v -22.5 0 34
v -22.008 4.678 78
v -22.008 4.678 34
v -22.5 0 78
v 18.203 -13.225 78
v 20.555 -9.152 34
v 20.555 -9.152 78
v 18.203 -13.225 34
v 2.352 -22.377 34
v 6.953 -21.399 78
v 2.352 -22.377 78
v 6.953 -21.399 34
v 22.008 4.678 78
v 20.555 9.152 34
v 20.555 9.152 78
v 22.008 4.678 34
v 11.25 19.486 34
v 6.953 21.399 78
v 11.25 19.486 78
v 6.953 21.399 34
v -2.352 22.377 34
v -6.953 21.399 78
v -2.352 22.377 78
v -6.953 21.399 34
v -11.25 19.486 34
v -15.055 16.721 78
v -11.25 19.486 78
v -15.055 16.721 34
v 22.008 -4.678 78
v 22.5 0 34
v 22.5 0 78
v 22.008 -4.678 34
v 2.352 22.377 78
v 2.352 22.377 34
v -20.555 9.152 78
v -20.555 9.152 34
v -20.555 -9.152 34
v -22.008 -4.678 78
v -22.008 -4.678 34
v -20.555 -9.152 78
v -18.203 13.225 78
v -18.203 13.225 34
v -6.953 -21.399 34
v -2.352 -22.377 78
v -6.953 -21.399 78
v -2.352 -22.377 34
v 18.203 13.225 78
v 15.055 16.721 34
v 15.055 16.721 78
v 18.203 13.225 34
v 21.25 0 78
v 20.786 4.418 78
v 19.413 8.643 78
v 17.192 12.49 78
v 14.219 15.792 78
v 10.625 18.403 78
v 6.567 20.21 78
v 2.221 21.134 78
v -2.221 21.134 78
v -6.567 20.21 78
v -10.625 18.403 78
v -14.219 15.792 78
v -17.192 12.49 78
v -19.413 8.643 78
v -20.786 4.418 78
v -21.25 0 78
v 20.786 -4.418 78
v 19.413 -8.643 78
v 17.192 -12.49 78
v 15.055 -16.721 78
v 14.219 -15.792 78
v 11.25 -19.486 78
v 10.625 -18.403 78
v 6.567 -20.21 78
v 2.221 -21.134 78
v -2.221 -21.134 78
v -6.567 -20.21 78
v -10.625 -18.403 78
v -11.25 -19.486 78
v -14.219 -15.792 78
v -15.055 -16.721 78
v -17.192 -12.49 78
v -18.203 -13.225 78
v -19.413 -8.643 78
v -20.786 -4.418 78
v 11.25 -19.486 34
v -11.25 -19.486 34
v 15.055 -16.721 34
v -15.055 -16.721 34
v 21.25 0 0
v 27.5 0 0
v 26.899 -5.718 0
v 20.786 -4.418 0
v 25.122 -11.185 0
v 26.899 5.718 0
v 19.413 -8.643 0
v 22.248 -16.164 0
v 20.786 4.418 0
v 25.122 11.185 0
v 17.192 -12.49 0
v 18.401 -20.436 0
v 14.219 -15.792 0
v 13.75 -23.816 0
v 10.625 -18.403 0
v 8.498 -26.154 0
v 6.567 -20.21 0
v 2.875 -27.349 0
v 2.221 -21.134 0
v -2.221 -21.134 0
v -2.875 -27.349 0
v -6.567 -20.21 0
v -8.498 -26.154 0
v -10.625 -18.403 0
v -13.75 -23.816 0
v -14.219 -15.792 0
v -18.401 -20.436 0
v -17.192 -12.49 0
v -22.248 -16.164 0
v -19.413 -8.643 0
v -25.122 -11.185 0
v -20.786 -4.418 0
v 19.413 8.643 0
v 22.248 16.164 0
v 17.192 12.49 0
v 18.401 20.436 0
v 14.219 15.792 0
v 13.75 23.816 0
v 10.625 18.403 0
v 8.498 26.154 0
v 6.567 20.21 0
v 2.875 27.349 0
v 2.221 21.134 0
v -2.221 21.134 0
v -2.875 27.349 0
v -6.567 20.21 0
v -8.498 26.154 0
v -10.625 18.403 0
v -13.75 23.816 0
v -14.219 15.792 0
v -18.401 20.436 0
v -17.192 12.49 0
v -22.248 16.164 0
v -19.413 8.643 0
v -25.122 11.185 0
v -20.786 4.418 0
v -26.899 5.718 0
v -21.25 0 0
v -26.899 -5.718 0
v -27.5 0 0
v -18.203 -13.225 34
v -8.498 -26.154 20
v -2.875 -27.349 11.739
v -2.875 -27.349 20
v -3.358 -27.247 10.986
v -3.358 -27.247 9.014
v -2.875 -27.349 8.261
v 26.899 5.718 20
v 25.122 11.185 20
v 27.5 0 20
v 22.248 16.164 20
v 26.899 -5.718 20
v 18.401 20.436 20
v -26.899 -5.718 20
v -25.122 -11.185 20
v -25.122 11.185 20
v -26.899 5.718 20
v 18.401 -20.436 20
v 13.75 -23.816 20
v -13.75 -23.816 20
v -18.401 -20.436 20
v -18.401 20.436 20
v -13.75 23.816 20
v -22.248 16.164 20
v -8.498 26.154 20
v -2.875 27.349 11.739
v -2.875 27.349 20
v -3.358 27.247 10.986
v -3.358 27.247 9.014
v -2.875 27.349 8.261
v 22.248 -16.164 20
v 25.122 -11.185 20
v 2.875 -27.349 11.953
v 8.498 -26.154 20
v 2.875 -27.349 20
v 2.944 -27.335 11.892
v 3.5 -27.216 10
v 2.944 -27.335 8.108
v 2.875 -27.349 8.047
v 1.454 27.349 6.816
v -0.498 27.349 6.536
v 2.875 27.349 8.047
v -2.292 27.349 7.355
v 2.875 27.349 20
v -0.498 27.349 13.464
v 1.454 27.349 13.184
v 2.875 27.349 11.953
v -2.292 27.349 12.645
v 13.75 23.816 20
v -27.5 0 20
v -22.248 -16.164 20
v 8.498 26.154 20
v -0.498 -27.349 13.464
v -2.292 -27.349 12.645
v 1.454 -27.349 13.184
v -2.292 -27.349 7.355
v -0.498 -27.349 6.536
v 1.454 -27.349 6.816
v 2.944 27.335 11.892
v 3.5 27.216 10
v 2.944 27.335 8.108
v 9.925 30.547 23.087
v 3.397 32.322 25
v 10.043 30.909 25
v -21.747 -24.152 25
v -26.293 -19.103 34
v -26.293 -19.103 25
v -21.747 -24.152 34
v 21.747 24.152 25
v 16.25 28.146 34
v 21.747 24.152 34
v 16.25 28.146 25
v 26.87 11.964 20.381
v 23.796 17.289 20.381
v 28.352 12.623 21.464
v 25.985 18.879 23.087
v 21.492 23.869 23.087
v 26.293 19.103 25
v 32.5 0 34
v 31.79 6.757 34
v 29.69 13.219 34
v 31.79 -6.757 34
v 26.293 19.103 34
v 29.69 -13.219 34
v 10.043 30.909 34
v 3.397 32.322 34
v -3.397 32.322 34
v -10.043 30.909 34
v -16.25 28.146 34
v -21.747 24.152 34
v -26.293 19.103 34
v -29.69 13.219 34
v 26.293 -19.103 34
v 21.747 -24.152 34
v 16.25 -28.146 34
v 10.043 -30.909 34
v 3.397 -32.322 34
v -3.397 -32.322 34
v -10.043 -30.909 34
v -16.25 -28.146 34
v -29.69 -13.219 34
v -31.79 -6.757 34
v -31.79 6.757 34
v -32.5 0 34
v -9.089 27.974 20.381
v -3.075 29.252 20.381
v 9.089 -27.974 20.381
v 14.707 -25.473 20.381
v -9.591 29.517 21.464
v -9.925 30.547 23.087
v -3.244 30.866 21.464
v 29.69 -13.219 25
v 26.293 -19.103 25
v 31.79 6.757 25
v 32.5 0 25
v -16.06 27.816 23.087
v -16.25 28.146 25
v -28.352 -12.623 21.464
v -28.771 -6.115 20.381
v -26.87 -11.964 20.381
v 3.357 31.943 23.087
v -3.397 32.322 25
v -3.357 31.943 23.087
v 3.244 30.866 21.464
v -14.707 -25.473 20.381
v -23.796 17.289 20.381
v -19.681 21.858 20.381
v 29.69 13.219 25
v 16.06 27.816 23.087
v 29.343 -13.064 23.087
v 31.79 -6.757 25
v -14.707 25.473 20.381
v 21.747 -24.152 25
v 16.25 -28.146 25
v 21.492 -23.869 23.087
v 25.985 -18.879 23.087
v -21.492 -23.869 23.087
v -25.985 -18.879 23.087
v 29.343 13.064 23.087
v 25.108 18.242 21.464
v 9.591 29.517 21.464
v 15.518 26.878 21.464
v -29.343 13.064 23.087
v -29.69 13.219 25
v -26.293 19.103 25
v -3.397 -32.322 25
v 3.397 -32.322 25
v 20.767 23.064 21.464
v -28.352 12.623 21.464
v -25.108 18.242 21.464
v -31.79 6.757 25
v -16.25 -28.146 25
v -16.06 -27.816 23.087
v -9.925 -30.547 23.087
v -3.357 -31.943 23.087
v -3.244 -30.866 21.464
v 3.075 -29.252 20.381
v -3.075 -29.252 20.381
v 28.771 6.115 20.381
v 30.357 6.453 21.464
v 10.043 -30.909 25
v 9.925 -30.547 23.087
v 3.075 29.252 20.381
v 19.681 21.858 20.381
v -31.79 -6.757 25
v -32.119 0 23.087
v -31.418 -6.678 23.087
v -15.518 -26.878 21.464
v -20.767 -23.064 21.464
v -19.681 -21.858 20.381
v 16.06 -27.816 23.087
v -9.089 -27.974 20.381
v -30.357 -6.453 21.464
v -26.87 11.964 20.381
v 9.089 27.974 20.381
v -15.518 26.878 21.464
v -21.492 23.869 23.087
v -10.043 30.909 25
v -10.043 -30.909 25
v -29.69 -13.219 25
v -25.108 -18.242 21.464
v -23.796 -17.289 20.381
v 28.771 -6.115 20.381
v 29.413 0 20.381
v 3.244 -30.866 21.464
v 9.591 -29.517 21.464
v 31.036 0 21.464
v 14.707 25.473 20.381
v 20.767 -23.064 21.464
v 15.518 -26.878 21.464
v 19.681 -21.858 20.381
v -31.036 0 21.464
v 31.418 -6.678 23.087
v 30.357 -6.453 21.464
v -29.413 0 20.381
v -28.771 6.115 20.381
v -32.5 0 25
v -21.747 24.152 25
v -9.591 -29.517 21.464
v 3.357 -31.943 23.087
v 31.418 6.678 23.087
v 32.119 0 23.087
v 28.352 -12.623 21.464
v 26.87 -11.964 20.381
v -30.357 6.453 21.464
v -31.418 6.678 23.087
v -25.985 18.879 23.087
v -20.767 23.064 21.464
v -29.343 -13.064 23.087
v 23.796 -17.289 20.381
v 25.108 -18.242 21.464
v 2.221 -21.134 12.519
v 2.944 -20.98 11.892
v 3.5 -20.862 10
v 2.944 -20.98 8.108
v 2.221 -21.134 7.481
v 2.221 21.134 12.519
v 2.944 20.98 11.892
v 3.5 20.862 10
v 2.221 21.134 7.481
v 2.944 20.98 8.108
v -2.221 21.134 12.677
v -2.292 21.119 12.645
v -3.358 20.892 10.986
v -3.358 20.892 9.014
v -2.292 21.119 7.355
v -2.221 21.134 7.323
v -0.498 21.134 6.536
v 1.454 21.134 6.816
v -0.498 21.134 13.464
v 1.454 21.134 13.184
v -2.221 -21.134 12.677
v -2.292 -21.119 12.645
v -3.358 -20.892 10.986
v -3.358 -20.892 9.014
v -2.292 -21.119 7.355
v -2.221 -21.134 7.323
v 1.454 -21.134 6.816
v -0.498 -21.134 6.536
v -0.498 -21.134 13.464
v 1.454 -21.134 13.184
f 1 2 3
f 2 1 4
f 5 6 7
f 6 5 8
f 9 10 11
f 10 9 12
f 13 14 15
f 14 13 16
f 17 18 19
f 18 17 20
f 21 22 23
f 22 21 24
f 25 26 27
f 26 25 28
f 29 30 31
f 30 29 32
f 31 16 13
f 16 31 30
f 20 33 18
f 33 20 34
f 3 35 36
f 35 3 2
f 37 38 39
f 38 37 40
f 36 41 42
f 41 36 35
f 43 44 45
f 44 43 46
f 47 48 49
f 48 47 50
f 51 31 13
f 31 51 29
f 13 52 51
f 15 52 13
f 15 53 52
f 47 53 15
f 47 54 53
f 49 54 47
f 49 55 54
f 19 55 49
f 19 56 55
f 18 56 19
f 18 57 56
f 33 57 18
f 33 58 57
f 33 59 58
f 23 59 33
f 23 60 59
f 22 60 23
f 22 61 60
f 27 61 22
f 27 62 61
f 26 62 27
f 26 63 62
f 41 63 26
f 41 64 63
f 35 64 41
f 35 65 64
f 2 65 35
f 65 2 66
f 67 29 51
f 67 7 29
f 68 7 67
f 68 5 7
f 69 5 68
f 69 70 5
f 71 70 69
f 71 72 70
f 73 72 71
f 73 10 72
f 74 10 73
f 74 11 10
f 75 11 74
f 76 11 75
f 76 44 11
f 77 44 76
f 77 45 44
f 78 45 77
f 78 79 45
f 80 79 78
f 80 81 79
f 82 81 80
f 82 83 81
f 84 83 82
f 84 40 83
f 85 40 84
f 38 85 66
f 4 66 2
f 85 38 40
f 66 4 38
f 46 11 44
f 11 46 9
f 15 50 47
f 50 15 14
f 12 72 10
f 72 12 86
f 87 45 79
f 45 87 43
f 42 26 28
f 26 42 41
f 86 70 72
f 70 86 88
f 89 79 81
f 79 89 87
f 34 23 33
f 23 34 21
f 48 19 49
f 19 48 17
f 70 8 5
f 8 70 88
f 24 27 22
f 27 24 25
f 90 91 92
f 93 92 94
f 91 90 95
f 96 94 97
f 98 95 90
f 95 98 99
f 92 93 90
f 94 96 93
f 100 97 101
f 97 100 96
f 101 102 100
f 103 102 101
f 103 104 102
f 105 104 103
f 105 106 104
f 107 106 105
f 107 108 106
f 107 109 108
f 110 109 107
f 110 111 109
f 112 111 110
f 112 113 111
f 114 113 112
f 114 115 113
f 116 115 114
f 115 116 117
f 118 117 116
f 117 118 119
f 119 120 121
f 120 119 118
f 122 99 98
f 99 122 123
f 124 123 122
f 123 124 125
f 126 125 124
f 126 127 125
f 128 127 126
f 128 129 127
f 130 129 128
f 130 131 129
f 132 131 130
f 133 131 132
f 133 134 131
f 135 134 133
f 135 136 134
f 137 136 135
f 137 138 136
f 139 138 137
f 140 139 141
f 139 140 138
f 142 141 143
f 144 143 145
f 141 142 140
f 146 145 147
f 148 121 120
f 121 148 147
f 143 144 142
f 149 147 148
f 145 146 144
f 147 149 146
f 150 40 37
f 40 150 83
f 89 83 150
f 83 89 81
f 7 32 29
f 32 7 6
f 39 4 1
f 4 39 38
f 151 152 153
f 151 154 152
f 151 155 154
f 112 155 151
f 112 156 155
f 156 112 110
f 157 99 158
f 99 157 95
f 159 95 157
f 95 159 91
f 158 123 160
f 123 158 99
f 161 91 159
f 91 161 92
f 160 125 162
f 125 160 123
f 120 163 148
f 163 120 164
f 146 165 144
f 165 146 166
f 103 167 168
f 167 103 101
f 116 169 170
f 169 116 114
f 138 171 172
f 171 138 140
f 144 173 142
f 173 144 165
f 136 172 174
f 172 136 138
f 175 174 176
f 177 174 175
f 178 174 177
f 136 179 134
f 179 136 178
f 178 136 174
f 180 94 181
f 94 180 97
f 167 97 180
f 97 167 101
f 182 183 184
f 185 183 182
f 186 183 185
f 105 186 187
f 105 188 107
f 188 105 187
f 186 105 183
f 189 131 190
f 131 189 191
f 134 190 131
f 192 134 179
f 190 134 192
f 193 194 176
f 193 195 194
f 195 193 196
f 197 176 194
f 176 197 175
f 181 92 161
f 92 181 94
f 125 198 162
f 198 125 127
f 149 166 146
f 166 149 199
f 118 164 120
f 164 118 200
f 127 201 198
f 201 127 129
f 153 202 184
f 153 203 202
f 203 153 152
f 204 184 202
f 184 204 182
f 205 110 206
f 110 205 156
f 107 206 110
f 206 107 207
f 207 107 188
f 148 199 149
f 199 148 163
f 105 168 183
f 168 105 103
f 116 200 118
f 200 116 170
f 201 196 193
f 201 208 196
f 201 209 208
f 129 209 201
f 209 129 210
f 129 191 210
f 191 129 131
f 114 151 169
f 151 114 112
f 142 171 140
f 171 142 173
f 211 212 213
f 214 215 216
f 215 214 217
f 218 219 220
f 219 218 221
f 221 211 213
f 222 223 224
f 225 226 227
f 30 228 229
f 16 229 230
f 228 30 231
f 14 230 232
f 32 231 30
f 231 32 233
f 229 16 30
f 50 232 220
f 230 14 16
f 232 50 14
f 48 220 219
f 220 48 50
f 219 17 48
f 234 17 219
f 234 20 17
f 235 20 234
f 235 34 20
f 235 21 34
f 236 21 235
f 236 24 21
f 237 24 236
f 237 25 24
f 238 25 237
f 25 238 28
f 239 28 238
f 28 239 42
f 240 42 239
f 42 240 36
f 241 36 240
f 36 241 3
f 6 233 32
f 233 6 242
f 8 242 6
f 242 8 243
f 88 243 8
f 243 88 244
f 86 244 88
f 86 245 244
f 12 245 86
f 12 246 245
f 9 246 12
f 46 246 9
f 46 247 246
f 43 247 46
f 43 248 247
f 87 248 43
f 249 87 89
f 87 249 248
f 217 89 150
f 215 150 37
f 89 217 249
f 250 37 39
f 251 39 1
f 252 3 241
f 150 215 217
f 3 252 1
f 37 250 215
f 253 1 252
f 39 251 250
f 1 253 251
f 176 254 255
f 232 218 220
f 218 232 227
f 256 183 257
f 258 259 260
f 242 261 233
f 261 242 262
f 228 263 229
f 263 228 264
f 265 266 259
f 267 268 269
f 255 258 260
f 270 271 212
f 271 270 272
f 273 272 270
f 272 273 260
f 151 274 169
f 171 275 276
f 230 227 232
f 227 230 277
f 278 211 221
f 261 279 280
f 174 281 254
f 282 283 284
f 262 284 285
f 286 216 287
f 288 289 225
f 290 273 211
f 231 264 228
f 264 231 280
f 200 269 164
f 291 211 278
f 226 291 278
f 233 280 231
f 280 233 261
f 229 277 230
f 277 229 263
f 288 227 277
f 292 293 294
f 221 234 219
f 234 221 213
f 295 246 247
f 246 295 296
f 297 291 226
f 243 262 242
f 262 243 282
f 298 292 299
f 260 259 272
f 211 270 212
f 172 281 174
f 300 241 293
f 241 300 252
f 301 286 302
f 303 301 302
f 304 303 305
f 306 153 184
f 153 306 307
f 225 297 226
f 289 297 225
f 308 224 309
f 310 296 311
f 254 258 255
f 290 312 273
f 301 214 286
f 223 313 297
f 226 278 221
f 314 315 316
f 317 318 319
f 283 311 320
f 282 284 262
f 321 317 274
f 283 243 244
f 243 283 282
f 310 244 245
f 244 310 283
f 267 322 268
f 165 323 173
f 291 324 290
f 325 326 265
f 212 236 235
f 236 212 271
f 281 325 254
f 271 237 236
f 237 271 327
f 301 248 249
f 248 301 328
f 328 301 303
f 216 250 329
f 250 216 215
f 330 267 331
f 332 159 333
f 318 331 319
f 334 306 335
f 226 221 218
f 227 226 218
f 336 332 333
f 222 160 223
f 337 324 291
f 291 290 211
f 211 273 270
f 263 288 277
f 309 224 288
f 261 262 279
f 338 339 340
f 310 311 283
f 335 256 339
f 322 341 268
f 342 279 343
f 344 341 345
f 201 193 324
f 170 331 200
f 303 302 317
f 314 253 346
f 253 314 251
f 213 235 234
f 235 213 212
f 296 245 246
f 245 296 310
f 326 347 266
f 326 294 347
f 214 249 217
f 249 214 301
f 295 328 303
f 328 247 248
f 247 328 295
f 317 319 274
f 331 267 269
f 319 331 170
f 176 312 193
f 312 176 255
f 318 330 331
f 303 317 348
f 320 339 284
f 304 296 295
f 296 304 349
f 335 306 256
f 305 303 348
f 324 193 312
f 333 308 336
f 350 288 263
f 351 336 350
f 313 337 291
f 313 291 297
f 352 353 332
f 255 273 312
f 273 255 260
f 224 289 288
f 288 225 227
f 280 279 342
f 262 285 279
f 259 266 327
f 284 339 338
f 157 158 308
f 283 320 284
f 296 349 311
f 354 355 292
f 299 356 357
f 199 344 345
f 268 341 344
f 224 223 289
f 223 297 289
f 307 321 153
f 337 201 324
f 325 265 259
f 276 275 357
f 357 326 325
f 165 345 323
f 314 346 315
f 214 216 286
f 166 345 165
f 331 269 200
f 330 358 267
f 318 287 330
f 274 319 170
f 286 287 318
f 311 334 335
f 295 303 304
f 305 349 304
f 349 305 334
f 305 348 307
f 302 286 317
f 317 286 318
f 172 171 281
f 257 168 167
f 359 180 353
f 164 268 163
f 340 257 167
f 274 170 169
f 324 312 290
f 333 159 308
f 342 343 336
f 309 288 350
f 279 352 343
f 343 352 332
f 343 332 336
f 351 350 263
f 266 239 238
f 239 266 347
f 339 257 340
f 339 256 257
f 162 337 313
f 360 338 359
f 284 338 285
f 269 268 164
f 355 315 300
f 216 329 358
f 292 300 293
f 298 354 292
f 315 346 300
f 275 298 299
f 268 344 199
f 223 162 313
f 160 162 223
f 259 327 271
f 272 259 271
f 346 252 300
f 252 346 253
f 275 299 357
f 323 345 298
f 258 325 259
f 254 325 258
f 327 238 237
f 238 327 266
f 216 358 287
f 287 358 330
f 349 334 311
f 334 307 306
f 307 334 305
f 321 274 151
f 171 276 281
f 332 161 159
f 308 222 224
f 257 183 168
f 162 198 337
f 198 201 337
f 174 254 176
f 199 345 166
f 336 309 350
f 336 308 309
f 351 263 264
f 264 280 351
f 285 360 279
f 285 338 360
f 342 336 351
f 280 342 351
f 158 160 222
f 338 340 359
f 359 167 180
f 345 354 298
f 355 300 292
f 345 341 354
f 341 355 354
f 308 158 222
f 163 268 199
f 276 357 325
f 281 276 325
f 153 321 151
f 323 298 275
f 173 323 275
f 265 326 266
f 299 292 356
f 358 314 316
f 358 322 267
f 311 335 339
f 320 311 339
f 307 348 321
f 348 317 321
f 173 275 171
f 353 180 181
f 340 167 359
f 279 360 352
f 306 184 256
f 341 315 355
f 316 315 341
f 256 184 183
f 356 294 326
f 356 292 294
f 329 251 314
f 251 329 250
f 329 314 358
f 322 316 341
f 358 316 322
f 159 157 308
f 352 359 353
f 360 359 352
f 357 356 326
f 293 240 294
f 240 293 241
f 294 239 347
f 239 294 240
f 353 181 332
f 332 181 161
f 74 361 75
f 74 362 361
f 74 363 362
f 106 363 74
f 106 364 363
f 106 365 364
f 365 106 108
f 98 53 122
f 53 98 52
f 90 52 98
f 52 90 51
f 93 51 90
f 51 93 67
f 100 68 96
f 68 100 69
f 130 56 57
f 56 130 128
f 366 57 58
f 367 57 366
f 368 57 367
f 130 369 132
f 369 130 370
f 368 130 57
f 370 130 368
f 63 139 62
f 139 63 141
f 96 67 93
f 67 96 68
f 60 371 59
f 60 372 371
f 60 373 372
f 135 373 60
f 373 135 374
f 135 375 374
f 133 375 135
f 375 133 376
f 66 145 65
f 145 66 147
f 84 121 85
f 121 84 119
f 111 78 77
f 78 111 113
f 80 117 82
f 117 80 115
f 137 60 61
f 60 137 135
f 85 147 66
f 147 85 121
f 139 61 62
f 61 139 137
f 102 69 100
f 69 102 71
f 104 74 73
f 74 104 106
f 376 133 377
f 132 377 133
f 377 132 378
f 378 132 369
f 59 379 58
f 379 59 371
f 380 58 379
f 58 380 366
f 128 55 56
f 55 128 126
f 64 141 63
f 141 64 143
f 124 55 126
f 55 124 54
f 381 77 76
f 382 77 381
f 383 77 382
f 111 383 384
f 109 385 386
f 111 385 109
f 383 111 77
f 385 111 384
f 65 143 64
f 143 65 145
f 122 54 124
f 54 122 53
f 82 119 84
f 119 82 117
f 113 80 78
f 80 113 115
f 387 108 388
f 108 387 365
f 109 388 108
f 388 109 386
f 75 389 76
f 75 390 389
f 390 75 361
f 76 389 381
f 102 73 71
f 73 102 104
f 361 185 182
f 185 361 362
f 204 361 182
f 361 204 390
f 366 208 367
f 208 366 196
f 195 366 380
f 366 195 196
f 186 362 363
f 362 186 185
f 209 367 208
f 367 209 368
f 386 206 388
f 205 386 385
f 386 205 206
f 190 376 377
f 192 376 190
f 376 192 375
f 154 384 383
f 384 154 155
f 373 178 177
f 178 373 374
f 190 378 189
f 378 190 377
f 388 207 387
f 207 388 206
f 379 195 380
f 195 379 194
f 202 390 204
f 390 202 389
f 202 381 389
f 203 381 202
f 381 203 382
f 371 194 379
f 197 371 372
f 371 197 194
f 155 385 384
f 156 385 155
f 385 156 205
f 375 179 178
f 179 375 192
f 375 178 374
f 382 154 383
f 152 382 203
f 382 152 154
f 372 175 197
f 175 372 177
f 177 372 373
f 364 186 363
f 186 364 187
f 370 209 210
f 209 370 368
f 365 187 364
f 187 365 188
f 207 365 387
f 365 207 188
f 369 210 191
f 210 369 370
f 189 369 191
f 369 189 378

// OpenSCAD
// file: parameters/verticalShaftHolderParameters.scad
// https://paper.dropbox.com/doc/Shaft-Holder-with-Bearings--BPUd0R93dqpLMge3XfPWzi2zAg-a79LjXcU3vrNJJHZMteSG

rollerBearingInsideDiameter = 45; // Same as Thrust Bearing bore diameter
rollerBearingHeight = 20;
rollerBearingOutsideDiameter = 52.2;

thrustBearingOutsideDiameter = 65;
thrustBearingHeight = 14;
thrustBearingOuterDiameterShaftWasher = 47;

thrustBearingMinimumAbutmentDiameter = 57; // This is a MINIMUM

comfortablePinningDiameter = 55; // Could maybe be bigger?
comfortablePinnedSectionHeight = 20; // May need testing
// file: parameters/commonParameters.scad
// All measurements in millimeters

// "horizontal" and "vertical" refer to how they are printed on the print bed,
// not how they work on the final assembly.
// ALWAYS print verticle pipes straight up if possible, that is 90 degrees from the bed.
// Attempting to print a slanted pipe will be troublesome and require testing for a proper size.
// However, you can print ANY angle ON the bed.

// 1.25" PVC Pipe:
horizontalPipeInsideDiameter_1_25pvc = 42.9;
verticalPipeInsideDiameter_1_25pvc = 42.5;

// 0.5" PVC Pipe:
horizontalPipeInsideDiameter_0_50pvc = 22.1;
verticalPipeInsideDiameter_0_50pvc = 21.7;

// Parameters
jointLegLength = 50;
jointWallThickness = 3.5;
jointPinningHoleDiameter = 7;
jointPinHoleOffset = 10;

// Walker Foot Parameters
inchesToMmConversionFactor = 25.4;

// Current idea is 11 x 21 inches.
walkerFootHeight = 11 * inchesToMmConversionFactor;
walkerFootLength = 21 * inchesToMmConversionFactor;
// Back of Foot is 4 inches longer to cause foot to hang AND LOOK as desired
// I tried 1 inch and it had basically NO affect on how it hangs.
// I think it looks cool at 4 inches, so I am going to test that.
// I *THINK* that it actually doesn't affect lenght of the walker, because the front
// of one compensates for the back of the other.
walkerFootCenterOffset = 0 * inchesToMmConversionFactor; // Remember to multiply any offset by the conversion factor.
walkerFootFrontLength = (walkerFootLength / 2) - (walkerFootCenterOffset / 2);
walkerFootBackLength = (walkerFootLength / 2) + (walkerFootCenterOffset / 2);

footLowerJointLegLength = 75;

// Angles
// This site is great for visualizing what you want: https://www.blocklayer.com/trig/scaleneeng.aspx
// Use this site to check your math and results: https://www.calculator.net/right-triangle-calculator.html
//echo("=======================================================");
//echo("Walker Foot Parameters");
//echo("walkerFootLength", walkerFootLength, walkerFootFrontLength + walkerFootBackLength);
//echo("=======================================================");
//echo("Front:");
//echo("walkerFootHeight (a)", walkerFootHeight);
//echo("walkerFootFrontLength (b)", walkerFootFrontLength);
//walkerFootFrontTriangleTopLength = sqrt(pow(walkerFootHeight, 2) + pow(walkerFootFrontLength, 2));
//echo("walkerFootFrontTriangleTopLength (c)", walkerFootFrontTriangleTopLength);
//walkerFootFrontJointAngle = asin(walkerFootHeight / walkerFootFrontTriangleTopLength);
//echo("walkerFootFrontJointAngle (α):", walkerFootFrontJointAngle);
//walkerAnkleFrontAngle = asin(walkerFootFrontLength / walkerFootFrontTriangleTopLength);
//echo("walkerAnkleFrontAngle (β)", walkerAnkleFrontAngle);
//echo("-------------------------------------------------------");
//echo("Back");
//echo("walkerFootBackLength (b)", walkerFootBackLength);
//walkerFootBackTriangleTopLength = sqrt(pow(walkerFootHeight, 2) + pow(walkerFootBackLength, 2));
//echo("walkerFootBackTriangleTopLength (c)", walkerFootBackTriangleTopLength);
//walkerFootBackJointAngle = asin(walkerFootHeight / walkerFootBackTriangleTopLength);
//echo("walkerFootBackJointAngle (α):", walkerFootBackJointAngle);
//walkerAnkleBackAngle = asin(walkerFootBackLength / walkerFootBackTriangleTopLength);
//echo("walkerAnkleBackAngle (β)", walkerAnkleBackAngle);
//echo("=======================================================");



// This height is purely based on giving space for nice triangles supports.
// It could be shorter, just be sure to adjust the triangles.
walkerBodyLowerShaftHolderRollerBearingHeightAboveThrustBearing = 50;

// 12v Battery Box
batteryHolderWallThickness = 5;

// Battery Dimensions
// https://www.power-sonic.com/product/ps-1290/
batteryHeight = 94;
batteryWidth = 65.6; // Ben uses 65.6, Web Site says 65
batteryLength = 150.6; // Ben uses 150.6, Web site says 141
batteryBoxDepth = 60; // This is arbitrary. Ben uses 60 for the Dalek

// Colors
JointColor = "CornflowerBlue";
PipeColor = "Pink";

// Resoution
// This is perfect for 3D Printing,
// but you may want to comment it out while working to improve preview
// performance
//$fa = 1;
//$fs = 0.4;
// Although this makes it VERY high rez, which might be better for the slicer? Experimenting with it instead.
// NOTE that using $fn causes FreeCAD and hence .step files exported to Fusion 360 to show round items as a series of faces instead of a single object.
//$fn = 500;
// file: verticalShaftHolder.scad
include <parameters/commonParameters.scad>;
include <parameters/verticalShaftHolderParameters.scad>;

// This piece should be able to slide onto the shaft,
// be pinned in place,
// Have a Thrust Bearing sit on it,
// and then have a part that moves around the shaft sit on it.

module verticalShaftHolder(includePinnedRing = true, thrustBearingSupportHeight = thrustBearingHeight,
rollerBearingHeightAboveThrustBearing = thrustBearingHeight, roundedThrustBearingSupport = true, thrustBearingHeightOverride = thrustBearingHeight) {

    totalPartHeight = (includePinnedRing ? comfortablePinnedSectionHeight : 0) +
        thrustBearingSupportHeight +
        thrustBearingHeightOverride +
        rollerBearingHeightAboveThrustBearing +
        rollerBearingHeight;
    echo(str("Height: ", totalPartHeight));

    difference() {
        union() {
            // This is for the roller bearing to work against,
            // and constitutes the overall height
            cylinder(h = totalPartHeight, d = rollerBearingInsideDiameter);

            if (includePinnedRing) {
                // Pin this part
                cylinder(h = comfortablePinnedSectionHeight, d = comfortablePinningDiameter);
            }

            // This is to support the thrust bearing
            translate([0, 0, includePinnedRing ? comfortablePinnedSectionHeight : 0])
                rotate([180, 0, 0])
                    translate([0, 0, - thrustBearingSupportHeight])
                        if (roundedThrustBearingSupport) {
                            hull() {
                                cylinder(h = thrustBearingSupportHeight - 5, d = thrustBearingOutsideDiameter);
                                translate([0, 0, thrustBearingSupportHeight - 5])
                                    rotate_extrude()
                                        translate([(thrustBearingOutsideDiameter / 2) - 5, 0]) circle(r = 5);
                            }
                        } else {
                                cylinder(h = thrustBearingSupportHeight, d = thrustBearingOutsideDiameter);
                        }
        }
        // Hollow out for the pipe to fit in.
        translate([0, 0, - 1]) // -1 just ensures we clear the bottom and don't leave a 2d "film"
            cylinder(h = totalPartHeight + 10, d = verticalPipeInsideDiameter_1_25pvc);

        if (includePinnedRing) {
            // Make a hole near the end of the leg for pinning
            // The -0.01 ensures that the end of the tube is clear.
            rotate([90, 0, 0])
                translate([0, comfortablePinnedSectionHeight / 2, 0])
                    cylinder(
                    h = 500, d = jointPinningHoleDiameter, center = true);
        }
    }
}

//verticalShaftHolder();

// Use this to view the two shafts together
//include<verticalShaftHolderPivotPoint.scad>;
//translate([0, 0, thrustBearingHeight * 2])
//    verticalShaftHolderPivotPoint();
// main file
include <verticalShaftHolder.scad>;

verticalShaftHolder(rollerBearingHeightAboveThrustBearing = 10);
